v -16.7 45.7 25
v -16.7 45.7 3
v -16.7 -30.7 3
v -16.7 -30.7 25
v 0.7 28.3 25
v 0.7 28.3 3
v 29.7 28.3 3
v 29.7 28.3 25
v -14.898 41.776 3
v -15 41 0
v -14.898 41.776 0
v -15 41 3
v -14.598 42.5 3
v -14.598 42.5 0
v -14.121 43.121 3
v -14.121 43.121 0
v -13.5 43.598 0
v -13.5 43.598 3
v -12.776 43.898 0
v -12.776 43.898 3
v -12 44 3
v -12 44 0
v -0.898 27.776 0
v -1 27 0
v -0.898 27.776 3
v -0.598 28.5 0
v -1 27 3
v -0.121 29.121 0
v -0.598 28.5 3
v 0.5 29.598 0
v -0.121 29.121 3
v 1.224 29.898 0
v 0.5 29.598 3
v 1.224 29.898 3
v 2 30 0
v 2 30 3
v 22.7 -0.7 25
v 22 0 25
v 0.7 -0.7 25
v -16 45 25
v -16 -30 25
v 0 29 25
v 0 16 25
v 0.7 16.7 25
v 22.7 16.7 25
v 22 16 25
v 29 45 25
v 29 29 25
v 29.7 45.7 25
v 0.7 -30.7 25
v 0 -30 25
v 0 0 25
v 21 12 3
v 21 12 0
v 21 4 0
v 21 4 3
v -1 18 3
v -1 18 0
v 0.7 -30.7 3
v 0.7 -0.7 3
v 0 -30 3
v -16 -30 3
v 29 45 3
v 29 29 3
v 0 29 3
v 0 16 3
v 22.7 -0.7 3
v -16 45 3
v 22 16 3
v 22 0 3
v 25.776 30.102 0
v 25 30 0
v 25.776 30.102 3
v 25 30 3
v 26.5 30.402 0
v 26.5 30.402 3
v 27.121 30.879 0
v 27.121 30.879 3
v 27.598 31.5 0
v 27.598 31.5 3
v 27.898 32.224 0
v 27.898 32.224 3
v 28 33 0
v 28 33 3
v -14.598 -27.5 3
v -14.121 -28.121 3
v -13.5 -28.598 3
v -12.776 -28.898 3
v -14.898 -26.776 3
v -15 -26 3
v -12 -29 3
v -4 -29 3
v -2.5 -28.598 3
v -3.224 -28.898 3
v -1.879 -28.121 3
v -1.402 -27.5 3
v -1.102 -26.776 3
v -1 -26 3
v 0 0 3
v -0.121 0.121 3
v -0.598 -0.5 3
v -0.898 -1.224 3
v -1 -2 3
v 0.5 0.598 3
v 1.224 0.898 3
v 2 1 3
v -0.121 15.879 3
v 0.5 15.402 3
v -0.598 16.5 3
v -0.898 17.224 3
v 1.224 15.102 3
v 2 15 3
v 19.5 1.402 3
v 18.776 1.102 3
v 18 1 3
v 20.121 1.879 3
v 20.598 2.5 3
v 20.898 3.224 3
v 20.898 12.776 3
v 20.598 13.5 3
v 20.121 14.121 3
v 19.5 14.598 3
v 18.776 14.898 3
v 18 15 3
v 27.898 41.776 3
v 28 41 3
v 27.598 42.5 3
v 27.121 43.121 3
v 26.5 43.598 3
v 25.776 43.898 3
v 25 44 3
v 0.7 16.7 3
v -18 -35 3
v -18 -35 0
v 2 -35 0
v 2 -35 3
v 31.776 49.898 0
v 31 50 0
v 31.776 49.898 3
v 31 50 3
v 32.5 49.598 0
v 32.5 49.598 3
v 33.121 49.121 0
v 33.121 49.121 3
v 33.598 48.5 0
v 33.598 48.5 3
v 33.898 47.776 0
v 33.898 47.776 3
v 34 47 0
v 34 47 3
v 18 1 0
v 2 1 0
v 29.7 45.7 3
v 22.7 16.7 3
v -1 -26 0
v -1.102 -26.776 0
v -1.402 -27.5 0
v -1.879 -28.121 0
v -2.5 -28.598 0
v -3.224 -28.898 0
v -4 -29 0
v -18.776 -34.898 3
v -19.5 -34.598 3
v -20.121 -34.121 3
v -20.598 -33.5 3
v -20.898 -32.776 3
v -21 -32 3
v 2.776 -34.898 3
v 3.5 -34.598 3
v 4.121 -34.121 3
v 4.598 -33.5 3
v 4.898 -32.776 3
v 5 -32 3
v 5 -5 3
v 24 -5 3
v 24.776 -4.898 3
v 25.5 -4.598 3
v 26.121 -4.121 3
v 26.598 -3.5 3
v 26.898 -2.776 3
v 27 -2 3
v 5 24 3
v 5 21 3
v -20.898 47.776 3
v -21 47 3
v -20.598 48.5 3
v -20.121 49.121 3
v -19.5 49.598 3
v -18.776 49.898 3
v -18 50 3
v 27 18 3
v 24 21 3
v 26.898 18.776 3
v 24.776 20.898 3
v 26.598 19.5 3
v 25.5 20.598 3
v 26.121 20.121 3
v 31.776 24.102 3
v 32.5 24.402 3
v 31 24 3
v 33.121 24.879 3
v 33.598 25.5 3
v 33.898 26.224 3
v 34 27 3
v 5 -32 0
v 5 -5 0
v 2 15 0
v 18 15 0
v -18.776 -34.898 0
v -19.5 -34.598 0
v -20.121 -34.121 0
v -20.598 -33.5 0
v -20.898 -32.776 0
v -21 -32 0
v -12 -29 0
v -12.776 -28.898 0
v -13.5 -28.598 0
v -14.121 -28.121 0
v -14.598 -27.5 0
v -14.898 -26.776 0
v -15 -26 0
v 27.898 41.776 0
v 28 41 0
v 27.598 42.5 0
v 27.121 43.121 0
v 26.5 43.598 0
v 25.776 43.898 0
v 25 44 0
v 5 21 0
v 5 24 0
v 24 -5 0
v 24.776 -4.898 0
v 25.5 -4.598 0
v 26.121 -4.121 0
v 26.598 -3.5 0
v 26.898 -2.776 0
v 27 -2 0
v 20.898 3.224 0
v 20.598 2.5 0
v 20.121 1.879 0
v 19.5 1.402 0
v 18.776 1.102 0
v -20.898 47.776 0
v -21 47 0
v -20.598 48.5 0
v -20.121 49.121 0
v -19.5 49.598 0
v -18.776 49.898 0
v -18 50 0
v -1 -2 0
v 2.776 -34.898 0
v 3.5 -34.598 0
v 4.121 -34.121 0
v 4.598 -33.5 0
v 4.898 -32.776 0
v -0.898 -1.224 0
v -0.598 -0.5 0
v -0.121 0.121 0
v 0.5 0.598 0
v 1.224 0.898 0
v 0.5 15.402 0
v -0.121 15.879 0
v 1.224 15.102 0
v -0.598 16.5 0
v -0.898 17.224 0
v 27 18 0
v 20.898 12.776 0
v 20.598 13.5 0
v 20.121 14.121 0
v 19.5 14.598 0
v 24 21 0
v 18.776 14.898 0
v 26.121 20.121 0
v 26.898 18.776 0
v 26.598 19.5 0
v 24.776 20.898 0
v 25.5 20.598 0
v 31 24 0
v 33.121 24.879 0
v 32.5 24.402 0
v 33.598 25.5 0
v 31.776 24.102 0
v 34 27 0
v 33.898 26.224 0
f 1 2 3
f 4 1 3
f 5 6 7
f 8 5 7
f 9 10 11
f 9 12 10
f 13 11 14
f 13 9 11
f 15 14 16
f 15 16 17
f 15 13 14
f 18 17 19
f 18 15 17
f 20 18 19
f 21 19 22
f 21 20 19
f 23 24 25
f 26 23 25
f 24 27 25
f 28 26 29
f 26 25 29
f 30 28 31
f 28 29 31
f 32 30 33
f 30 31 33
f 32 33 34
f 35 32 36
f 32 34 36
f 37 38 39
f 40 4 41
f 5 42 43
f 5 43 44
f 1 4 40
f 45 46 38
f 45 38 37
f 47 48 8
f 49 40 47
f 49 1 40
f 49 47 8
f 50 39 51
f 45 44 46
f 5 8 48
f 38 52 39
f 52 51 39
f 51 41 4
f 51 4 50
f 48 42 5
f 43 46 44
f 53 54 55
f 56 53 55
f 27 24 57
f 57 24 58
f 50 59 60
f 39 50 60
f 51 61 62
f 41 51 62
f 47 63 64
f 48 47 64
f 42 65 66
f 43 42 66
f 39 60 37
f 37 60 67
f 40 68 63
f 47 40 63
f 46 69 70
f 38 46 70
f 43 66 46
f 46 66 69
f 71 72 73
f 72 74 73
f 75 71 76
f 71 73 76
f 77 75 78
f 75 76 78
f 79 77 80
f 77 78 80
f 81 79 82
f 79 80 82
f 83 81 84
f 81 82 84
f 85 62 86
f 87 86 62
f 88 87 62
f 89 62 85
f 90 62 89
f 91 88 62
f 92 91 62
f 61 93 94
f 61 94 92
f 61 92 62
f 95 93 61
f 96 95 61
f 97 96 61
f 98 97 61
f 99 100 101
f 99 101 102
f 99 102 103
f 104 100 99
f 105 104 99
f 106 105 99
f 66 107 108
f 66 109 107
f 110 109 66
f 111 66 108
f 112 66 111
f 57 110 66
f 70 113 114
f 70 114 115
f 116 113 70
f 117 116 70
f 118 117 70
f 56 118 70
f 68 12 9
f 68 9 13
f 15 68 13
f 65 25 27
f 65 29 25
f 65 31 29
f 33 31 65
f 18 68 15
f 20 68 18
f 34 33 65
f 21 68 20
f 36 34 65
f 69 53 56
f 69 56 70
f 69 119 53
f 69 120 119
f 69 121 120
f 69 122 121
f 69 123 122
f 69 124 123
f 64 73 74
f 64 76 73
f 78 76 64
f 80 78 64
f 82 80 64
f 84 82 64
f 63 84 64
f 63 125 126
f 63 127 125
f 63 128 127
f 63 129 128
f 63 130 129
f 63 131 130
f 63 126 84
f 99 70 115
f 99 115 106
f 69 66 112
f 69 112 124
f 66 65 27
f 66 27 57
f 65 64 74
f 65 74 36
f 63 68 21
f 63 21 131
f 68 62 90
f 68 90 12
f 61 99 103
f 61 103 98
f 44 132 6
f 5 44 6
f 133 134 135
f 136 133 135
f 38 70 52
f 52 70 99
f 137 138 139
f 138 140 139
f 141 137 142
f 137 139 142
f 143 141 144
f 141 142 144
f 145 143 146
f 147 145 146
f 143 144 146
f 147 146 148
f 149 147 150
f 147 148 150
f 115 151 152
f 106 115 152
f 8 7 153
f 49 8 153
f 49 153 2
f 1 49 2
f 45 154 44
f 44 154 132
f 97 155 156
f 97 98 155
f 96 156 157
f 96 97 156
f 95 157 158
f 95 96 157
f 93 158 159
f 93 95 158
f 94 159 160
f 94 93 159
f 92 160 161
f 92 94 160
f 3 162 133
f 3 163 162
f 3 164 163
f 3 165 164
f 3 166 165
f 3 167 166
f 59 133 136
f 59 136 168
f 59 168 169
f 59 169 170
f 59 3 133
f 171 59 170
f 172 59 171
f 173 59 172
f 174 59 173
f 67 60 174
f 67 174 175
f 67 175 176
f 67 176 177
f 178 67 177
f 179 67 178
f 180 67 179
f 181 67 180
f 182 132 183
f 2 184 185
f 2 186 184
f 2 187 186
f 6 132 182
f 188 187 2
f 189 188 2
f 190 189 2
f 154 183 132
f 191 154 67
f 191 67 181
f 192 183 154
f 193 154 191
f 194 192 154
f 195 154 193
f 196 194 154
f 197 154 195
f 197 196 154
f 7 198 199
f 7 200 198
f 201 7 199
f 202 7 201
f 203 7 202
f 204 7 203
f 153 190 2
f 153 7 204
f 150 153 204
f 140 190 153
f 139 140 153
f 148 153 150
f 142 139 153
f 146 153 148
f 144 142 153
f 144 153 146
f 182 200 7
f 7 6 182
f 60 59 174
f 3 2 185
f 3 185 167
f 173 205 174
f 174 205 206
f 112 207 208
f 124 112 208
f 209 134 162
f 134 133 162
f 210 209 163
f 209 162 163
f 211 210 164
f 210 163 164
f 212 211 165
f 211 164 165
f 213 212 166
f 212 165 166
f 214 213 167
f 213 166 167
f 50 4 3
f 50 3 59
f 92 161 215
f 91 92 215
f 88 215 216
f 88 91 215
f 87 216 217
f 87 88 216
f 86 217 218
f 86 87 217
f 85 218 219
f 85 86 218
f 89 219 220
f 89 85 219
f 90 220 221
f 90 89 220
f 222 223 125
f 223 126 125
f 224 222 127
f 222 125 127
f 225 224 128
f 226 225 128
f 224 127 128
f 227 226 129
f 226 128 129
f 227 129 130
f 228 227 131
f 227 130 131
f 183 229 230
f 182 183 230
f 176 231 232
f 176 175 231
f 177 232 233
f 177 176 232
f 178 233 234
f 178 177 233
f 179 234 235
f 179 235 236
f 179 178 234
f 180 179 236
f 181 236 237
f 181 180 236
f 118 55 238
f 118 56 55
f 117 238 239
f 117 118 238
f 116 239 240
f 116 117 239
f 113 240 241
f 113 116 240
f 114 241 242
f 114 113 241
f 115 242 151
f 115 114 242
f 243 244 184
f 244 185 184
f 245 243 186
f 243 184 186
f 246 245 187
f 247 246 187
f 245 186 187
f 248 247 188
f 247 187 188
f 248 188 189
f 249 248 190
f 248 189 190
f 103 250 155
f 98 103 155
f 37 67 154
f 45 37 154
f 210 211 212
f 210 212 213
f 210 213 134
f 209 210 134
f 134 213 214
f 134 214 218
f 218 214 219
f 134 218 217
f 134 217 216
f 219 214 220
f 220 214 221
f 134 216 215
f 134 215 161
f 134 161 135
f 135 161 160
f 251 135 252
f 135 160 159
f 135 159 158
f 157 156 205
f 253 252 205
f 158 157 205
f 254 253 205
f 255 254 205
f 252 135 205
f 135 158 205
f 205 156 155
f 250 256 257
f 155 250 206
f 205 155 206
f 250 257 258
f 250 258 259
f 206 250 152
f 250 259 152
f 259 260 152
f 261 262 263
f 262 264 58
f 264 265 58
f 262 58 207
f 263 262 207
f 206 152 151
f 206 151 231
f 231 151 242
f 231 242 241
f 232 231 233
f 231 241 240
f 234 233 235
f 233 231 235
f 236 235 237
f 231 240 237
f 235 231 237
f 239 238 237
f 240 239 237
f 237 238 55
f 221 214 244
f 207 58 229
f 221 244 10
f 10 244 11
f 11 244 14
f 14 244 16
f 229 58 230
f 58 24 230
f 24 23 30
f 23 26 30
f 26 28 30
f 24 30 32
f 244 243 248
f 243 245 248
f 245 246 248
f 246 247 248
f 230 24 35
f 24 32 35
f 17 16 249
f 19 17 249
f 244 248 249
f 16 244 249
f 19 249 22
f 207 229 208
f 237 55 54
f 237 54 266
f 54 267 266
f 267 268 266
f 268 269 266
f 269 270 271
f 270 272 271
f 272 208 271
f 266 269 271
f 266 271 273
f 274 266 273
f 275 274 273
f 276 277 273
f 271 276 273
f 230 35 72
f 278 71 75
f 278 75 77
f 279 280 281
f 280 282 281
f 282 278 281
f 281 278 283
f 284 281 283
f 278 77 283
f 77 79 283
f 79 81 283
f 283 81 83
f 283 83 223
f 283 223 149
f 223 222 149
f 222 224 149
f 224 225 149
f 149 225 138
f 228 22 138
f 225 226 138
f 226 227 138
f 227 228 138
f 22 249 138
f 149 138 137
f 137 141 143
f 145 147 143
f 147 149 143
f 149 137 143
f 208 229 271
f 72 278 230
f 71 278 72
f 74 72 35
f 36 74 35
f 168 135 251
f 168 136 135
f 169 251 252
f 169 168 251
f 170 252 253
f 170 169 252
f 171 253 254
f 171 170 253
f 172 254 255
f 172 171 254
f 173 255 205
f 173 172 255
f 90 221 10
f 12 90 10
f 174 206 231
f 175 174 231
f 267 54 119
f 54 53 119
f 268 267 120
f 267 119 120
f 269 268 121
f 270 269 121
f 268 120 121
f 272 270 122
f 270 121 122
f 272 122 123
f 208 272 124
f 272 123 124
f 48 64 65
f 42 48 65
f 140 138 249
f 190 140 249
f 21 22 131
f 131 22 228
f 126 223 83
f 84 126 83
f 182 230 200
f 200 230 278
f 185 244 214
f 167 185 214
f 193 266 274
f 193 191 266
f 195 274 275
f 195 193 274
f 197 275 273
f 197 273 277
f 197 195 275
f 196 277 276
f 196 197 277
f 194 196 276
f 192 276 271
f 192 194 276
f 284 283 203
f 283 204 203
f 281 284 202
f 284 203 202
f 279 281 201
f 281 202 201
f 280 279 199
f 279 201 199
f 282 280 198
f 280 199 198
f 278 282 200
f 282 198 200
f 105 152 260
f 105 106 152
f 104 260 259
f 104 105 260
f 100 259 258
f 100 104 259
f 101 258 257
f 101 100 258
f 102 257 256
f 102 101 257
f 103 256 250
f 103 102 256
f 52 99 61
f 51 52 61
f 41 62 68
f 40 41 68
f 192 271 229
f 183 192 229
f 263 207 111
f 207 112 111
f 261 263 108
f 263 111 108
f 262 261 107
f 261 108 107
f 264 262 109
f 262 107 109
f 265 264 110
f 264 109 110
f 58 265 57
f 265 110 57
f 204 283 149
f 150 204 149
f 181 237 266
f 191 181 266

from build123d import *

# Parameters (mm, degrees)
F1_DEPTH = 3
F2_DEPTH = 25
F3_R     = 3


with BuildPart() as f1:
    # F0 (on Top) → F1 (new body)
    with BuildSketch(Plane.XY):
        Polygon((-21, -35), (5, -35), (5, -5), (27, -5), (27, 21), (5, 21), (5, 24), (34, 24), (34, 50), (-21, 50), align=None)
        Polygon((-16.7, 45.7), (29.7, 45.7), (29.7, 28.3), (0.7, 28.3), (0.7, 16.7), (22.7, 16.7), (22.7, -0.7), (0.7, -0.7), (0.7, -30.7), (-16.7, -30.7), align=None, mode=Mode.SUBTRACT)
        Polygon((29.7, 28.3), (29.7, 45.7), (-16.7, 45.7), (-16.7, -30.7), (0.7, -30.7), (0.7, -0.7), (22.7, -0.7), (22.7, 16.7), (0.7, 16.7), (0.7, 28.3), align=None)
        Polygon((22, 0), (0, 0), (0, -30), (-16, -30), (-16, 45), (29, 45), (29, 29), (0, 29), (0, 16), (22, 16), align=None, mode=Mode.SUBTRACT)
        Polygon((0, -30), (0, 0), (22, 0), (22, 16), (0, 16), (0, 29), (29, 29), (29, 45), (-16, 45), (-16, -30), align=None)
        Polygon((21, 1), (-1, 1), (-1, -29), (-15, -29), (-15, 44), (28, 44), (28, 30), (-1, 30), (-1, 15), (21, 15), align=None, mode=Mode.SUBTRACT)
    extrude(amount=F1_DEPTH)

    # F0 (on Top) → F2 (join)
    with BuildSketch(Plane.XY):
        Polygon((29.7, 28.3), (29.7, 45.7), (-16.7, 45.7), (-16.7, -30.7), (0.7, -30.7), (0.7, -0.7), (22.7, -0.7), (22.7, 16.7), (0.7, 16.7), (0.7, 28.3), align=None)
        Polygon((22, 0), (0, 0), (0, -30), (-16, -30), (-16, 45), (29, 45), (29, 29), (0, 29), (0, 16), (22, 16), align=None, mode=Mode.SUBTRACT)
    extrude(amount=F2_DEPTH)

    # F3
    f3_edges = [f1.edges().sort_by_distance(p)[0] for p in [
        (27, 21, 1.5),
        (-1, 15, 1.5),
        (27, -5, 1.5),
        (5, -35, 1.5),
        (-21, -35, 1.5),
        (-21, 50, 1.5),
        (34, 24, 1.5),
        (34, 50, 1.5),
        (-1, 30, 1.5),
        (-1, 1, 1.5),
        (-1, -29, 1.5),
        (-15, -29, 1.5),
        (21, 1, 1.5),
        (21, 15, 1.5),
        (28, 30, 1.5),
        (28, 44, 1.5),
        (-15, 44, 1.5),
    ]]
    fillet(f3_edges, radius=F3_R)


solid = f1.part
